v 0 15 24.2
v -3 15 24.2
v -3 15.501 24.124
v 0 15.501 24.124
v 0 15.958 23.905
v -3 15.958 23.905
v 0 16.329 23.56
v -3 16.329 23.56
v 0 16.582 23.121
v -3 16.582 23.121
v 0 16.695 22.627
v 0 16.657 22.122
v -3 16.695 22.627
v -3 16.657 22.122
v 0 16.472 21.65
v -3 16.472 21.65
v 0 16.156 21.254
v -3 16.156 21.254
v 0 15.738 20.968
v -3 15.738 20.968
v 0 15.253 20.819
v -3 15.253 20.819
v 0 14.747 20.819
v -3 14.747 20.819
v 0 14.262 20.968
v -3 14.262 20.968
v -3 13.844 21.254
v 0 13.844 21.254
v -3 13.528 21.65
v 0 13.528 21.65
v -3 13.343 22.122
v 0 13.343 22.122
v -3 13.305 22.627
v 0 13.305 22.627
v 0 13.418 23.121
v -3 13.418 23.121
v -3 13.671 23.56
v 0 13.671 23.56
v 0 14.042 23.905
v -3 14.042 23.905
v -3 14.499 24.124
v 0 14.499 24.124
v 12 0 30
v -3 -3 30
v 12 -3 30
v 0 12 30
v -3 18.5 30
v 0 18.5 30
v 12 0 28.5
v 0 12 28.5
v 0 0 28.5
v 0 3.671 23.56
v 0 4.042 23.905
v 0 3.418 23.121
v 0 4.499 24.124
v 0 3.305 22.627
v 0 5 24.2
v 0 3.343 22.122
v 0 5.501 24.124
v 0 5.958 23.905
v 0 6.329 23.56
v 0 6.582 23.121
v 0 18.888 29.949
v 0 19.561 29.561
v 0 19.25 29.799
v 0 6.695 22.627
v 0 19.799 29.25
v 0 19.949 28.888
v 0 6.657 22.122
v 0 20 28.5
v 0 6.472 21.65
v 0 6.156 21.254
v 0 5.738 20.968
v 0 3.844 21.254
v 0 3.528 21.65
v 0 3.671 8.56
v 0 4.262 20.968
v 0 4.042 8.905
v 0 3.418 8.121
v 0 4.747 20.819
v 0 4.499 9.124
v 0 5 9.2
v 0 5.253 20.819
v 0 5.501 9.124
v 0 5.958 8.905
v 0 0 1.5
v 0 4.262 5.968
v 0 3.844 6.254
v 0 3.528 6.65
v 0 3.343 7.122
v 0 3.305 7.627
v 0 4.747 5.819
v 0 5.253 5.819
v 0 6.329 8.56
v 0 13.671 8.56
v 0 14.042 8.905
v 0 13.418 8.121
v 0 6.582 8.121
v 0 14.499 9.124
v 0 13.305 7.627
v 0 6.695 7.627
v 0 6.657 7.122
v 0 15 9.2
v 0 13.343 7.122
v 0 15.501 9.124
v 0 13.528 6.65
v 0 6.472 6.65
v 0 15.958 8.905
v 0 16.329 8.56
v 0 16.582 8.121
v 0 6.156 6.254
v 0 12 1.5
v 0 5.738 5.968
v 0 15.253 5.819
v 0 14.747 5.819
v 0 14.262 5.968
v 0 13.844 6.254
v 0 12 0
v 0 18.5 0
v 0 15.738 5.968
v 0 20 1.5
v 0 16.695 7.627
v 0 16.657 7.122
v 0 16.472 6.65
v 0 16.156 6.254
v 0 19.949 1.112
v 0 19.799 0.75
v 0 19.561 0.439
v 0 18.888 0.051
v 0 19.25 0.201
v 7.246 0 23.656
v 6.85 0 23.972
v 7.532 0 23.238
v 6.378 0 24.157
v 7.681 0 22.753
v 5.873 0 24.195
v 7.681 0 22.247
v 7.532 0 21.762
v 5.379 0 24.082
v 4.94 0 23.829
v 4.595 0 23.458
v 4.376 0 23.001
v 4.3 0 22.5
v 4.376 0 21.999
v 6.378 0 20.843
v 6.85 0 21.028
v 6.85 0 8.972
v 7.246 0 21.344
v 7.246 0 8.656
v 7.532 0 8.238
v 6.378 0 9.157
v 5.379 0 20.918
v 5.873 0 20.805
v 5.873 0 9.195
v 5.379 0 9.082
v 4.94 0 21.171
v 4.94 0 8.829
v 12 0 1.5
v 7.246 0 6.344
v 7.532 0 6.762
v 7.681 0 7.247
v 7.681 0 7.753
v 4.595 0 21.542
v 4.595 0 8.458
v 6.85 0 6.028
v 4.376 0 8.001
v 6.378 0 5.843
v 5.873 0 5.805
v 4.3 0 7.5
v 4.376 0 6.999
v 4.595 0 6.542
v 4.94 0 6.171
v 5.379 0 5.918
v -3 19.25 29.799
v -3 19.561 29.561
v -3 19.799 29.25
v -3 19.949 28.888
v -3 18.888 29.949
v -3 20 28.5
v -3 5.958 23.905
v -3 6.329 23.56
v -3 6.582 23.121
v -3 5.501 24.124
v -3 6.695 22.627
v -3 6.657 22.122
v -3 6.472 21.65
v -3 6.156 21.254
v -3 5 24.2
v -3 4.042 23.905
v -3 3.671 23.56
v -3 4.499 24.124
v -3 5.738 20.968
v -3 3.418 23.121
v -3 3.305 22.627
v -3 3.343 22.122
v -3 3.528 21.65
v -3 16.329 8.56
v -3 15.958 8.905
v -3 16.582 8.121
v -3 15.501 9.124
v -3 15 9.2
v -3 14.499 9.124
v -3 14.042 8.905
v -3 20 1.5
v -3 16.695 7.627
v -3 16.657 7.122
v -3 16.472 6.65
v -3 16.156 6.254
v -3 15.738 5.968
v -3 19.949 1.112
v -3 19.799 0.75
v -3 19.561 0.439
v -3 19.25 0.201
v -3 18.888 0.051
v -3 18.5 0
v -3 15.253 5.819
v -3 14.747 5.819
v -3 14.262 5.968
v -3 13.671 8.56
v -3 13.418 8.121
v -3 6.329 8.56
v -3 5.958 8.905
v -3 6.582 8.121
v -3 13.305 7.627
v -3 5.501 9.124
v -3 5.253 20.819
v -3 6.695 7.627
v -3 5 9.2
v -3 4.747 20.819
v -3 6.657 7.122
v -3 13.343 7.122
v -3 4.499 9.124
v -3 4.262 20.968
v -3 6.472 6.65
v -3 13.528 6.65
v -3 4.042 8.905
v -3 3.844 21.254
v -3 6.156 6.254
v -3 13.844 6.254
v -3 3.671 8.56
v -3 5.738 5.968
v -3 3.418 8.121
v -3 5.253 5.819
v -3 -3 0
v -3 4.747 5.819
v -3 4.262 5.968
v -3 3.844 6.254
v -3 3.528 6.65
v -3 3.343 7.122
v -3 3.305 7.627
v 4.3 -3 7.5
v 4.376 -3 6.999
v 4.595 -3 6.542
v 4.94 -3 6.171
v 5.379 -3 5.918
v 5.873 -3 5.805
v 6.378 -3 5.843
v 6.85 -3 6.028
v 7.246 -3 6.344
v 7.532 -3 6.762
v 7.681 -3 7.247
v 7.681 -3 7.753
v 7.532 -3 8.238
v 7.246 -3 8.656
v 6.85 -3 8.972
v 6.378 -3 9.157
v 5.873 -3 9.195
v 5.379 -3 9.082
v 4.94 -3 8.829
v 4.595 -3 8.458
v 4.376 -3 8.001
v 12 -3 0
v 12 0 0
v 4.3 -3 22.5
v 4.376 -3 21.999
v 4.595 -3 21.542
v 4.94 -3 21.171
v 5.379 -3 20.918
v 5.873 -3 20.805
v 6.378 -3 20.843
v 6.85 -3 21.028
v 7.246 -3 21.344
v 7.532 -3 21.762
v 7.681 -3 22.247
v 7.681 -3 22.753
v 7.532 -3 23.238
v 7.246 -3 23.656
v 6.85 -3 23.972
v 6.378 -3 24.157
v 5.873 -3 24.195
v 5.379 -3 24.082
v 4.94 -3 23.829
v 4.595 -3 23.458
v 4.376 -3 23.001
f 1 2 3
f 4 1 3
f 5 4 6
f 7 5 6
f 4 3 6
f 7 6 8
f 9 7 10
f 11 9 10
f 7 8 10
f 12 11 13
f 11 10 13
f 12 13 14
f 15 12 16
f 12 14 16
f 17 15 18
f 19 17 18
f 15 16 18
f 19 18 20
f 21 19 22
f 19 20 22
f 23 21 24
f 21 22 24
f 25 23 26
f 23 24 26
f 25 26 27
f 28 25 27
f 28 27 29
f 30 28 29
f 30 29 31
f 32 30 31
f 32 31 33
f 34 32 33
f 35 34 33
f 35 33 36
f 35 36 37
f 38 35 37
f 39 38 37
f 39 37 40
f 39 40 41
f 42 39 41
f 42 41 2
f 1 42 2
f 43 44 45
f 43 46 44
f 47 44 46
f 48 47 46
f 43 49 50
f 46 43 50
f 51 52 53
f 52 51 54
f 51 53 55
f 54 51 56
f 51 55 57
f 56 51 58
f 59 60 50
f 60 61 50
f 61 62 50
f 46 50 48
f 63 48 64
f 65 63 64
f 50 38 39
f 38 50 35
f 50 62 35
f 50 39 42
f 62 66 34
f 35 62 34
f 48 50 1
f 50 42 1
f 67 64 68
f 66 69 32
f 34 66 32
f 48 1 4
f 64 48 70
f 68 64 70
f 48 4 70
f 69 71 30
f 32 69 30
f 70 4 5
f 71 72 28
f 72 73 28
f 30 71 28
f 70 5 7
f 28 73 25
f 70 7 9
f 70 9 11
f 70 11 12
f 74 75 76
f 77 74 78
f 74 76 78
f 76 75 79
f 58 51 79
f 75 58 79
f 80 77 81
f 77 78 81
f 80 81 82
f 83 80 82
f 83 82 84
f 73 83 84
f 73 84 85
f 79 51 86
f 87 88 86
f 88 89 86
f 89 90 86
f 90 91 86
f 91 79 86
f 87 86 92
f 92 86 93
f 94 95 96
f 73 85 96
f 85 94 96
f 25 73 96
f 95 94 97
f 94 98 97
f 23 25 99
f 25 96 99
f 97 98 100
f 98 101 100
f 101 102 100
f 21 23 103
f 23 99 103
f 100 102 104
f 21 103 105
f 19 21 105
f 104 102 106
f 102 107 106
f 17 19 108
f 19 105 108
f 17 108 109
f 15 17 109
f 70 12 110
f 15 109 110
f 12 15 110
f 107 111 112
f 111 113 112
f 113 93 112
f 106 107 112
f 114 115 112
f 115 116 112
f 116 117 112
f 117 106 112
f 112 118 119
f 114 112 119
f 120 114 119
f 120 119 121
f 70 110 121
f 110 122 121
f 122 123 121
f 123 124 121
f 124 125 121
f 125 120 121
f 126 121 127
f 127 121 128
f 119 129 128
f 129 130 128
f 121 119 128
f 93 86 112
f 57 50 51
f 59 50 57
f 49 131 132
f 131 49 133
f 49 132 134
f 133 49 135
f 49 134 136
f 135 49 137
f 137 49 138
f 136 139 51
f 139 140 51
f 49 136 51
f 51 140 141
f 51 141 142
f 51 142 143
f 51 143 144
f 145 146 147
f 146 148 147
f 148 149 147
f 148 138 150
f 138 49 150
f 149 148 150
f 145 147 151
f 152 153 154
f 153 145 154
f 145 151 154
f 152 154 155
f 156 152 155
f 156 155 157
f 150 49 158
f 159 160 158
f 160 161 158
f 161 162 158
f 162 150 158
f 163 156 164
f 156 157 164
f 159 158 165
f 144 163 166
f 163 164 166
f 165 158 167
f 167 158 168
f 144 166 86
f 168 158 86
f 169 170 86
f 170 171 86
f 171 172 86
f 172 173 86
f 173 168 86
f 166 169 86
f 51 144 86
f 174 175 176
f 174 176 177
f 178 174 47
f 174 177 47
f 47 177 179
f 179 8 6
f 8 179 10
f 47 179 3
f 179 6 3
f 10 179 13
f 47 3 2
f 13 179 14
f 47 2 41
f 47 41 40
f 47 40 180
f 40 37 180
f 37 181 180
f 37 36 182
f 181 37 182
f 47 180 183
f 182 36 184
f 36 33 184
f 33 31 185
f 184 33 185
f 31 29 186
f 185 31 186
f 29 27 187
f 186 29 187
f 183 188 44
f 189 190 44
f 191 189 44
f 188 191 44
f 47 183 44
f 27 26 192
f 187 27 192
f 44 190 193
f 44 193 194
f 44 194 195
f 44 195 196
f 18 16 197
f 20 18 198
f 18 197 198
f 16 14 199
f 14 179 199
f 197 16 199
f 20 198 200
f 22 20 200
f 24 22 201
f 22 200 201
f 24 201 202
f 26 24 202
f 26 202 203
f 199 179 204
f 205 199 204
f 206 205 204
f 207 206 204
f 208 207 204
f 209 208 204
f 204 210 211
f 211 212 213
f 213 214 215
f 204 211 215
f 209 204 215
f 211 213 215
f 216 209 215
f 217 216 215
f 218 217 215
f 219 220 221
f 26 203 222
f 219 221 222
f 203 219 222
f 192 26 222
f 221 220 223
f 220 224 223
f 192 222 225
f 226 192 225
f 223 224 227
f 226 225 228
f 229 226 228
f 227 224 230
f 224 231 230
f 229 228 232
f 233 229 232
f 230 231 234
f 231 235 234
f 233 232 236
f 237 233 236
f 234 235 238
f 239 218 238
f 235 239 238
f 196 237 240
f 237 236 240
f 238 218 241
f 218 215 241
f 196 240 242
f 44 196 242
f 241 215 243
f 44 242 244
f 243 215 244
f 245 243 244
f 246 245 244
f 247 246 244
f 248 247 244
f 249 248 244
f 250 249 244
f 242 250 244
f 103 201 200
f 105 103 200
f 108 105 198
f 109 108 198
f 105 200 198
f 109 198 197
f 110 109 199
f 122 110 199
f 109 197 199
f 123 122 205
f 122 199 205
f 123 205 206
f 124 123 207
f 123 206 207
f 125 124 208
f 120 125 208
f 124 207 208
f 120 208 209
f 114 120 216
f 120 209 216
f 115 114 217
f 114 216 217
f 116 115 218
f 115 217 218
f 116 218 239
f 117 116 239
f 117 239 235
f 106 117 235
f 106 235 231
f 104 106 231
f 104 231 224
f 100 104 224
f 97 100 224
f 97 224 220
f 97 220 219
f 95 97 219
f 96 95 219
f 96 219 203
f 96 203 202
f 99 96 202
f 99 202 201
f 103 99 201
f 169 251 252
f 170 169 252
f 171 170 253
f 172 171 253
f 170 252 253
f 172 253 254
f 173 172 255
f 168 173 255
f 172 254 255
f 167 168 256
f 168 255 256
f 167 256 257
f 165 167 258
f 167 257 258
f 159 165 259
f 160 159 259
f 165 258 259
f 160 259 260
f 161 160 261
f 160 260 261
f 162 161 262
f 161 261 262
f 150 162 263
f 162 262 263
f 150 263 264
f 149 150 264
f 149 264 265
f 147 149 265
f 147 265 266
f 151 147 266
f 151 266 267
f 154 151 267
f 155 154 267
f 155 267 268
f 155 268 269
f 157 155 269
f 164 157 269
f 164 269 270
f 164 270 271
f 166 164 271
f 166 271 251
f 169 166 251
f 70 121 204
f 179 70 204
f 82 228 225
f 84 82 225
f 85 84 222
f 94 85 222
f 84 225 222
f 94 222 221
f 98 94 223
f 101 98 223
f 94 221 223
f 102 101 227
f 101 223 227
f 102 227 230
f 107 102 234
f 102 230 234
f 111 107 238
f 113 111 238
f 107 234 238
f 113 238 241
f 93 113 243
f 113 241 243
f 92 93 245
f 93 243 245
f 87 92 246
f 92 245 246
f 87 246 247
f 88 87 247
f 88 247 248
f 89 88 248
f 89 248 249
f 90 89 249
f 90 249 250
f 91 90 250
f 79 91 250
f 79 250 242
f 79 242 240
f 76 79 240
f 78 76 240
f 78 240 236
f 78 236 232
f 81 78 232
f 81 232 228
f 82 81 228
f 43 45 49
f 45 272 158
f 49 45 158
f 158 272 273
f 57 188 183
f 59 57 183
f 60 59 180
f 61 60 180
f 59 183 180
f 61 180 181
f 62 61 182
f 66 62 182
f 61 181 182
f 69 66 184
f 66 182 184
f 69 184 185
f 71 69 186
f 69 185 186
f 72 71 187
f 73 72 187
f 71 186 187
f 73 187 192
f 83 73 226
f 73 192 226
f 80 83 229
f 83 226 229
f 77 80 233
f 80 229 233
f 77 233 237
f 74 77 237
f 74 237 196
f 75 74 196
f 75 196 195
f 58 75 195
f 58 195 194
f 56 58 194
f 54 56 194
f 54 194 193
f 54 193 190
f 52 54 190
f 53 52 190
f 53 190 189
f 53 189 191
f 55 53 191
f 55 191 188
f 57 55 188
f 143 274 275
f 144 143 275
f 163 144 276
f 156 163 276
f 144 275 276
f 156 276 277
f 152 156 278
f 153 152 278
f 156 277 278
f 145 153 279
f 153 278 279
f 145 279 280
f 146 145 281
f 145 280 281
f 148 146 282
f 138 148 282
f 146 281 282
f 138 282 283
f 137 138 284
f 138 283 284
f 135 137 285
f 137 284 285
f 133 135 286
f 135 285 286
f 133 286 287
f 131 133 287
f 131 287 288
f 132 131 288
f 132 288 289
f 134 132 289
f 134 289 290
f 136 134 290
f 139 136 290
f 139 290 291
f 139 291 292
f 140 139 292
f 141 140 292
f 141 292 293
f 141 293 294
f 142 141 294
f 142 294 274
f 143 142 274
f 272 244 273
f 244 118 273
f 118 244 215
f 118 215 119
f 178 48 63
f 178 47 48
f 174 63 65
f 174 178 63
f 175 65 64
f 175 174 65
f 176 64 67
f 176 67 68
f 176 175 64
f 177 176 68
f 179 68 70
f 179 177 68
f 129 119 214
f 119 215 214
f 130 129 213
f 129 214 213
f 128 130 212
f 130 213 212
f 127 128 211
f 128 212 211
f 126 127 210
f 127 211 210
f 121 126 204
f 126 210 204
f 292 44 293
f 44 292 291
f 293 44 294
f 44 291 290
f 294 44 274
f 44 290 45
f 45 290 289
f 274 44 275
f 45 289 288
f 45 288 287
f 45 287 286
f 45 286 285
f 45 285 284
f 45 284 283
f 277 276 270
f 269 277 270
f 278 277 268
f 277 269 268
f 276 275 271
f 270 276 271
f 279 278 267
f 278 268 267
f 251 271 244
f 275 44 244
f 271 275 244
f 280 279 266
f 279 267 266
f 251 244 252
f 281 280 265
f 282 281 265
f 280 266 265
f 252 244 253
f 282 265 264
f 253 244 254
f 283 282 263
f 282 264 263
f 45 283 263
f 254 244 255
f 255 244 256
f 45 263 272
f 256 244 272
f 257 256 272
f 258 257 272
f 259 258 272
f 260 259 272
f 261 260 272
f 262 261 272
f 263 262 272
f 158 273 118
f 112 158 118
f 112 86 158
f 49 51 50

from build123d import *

# Parameters (mm, degrees)
PROFILE_EXTRUDE_DEPTH     = 30
GUSSET_1_EXTRUDE_DEPTH    = 1.5
GUSSET_START              = 28.5
GUSSET_2_EXTRUDE_DEPTH    = 1.5
SOLENOID_MOUNTING_HOLES_D = 3.4
M3_MOUNTING_HOLES_D       = 3.4
CORNER_FILLETS_R          = 1.5


with BuildPart() as part:
    # Profile Sketch → Profile  Extrude (new body)
    with BuildSketch(Plane.XY):
        Polygon((0, 0), (0, 20), (-3, 20), (-3, -3), (12, -3), (12, 0), align=None)
    extrude(amount=PROFILE_EXTRUDE_DEPTH)

    # Gusset Sketch → Gusset 1 Extrude (add)
    with BuildSketch(Plane.XY):
        Polygon((0, 0), (12, 0), (0, 12), align=None)
    extrude(amount=GUSSET_1_EXTRUDE_DEPTH)

    # Gusset Sketch<2> → Gusset 2 Extrude (add)
    with BuildSketch(Plane.XY.offset(GUSSET_START)):
        Polygon((0, 0), (12, 0), (0, 12), align=None)
    extrude(amount=GUSSET_2_EXTRUDE_DEPTH)

    # Solenoid Mounting Holes (through all)
    with Locations(Plane(origin=(0, 0, 0), x_dir=(0, 0, -1), z_dir=(1, 0, 0))):
        with Locations((-7.5, 15), (-22.5, 15), (-22.5, 5), (-7.5, 5)):
            Hole(SOLENOID_MOUNTING_HOLES_D / 2)

    # M3 Mounting Holes (through all)
    with Locations(Plane(origin=(0, 0, 0), x_dir=(1, 0, 0), z_dir=(0, 1, 0))):
        with Locations((6, -22.5), (6, -7.5)):
            Hole(M3_MOUNTING_HOLES_D / 2)

    # Corner Fillets
    corner_fillets_edges = [part.edges().sort_by_distance(p)[0] for p in [
        (-1.5, 20, 30),
        (-1.5, 20, 0),
    ]]
    fillet(corner_fillets_edges, radius=CORNER_FILLETS_R)


solid = part.part
